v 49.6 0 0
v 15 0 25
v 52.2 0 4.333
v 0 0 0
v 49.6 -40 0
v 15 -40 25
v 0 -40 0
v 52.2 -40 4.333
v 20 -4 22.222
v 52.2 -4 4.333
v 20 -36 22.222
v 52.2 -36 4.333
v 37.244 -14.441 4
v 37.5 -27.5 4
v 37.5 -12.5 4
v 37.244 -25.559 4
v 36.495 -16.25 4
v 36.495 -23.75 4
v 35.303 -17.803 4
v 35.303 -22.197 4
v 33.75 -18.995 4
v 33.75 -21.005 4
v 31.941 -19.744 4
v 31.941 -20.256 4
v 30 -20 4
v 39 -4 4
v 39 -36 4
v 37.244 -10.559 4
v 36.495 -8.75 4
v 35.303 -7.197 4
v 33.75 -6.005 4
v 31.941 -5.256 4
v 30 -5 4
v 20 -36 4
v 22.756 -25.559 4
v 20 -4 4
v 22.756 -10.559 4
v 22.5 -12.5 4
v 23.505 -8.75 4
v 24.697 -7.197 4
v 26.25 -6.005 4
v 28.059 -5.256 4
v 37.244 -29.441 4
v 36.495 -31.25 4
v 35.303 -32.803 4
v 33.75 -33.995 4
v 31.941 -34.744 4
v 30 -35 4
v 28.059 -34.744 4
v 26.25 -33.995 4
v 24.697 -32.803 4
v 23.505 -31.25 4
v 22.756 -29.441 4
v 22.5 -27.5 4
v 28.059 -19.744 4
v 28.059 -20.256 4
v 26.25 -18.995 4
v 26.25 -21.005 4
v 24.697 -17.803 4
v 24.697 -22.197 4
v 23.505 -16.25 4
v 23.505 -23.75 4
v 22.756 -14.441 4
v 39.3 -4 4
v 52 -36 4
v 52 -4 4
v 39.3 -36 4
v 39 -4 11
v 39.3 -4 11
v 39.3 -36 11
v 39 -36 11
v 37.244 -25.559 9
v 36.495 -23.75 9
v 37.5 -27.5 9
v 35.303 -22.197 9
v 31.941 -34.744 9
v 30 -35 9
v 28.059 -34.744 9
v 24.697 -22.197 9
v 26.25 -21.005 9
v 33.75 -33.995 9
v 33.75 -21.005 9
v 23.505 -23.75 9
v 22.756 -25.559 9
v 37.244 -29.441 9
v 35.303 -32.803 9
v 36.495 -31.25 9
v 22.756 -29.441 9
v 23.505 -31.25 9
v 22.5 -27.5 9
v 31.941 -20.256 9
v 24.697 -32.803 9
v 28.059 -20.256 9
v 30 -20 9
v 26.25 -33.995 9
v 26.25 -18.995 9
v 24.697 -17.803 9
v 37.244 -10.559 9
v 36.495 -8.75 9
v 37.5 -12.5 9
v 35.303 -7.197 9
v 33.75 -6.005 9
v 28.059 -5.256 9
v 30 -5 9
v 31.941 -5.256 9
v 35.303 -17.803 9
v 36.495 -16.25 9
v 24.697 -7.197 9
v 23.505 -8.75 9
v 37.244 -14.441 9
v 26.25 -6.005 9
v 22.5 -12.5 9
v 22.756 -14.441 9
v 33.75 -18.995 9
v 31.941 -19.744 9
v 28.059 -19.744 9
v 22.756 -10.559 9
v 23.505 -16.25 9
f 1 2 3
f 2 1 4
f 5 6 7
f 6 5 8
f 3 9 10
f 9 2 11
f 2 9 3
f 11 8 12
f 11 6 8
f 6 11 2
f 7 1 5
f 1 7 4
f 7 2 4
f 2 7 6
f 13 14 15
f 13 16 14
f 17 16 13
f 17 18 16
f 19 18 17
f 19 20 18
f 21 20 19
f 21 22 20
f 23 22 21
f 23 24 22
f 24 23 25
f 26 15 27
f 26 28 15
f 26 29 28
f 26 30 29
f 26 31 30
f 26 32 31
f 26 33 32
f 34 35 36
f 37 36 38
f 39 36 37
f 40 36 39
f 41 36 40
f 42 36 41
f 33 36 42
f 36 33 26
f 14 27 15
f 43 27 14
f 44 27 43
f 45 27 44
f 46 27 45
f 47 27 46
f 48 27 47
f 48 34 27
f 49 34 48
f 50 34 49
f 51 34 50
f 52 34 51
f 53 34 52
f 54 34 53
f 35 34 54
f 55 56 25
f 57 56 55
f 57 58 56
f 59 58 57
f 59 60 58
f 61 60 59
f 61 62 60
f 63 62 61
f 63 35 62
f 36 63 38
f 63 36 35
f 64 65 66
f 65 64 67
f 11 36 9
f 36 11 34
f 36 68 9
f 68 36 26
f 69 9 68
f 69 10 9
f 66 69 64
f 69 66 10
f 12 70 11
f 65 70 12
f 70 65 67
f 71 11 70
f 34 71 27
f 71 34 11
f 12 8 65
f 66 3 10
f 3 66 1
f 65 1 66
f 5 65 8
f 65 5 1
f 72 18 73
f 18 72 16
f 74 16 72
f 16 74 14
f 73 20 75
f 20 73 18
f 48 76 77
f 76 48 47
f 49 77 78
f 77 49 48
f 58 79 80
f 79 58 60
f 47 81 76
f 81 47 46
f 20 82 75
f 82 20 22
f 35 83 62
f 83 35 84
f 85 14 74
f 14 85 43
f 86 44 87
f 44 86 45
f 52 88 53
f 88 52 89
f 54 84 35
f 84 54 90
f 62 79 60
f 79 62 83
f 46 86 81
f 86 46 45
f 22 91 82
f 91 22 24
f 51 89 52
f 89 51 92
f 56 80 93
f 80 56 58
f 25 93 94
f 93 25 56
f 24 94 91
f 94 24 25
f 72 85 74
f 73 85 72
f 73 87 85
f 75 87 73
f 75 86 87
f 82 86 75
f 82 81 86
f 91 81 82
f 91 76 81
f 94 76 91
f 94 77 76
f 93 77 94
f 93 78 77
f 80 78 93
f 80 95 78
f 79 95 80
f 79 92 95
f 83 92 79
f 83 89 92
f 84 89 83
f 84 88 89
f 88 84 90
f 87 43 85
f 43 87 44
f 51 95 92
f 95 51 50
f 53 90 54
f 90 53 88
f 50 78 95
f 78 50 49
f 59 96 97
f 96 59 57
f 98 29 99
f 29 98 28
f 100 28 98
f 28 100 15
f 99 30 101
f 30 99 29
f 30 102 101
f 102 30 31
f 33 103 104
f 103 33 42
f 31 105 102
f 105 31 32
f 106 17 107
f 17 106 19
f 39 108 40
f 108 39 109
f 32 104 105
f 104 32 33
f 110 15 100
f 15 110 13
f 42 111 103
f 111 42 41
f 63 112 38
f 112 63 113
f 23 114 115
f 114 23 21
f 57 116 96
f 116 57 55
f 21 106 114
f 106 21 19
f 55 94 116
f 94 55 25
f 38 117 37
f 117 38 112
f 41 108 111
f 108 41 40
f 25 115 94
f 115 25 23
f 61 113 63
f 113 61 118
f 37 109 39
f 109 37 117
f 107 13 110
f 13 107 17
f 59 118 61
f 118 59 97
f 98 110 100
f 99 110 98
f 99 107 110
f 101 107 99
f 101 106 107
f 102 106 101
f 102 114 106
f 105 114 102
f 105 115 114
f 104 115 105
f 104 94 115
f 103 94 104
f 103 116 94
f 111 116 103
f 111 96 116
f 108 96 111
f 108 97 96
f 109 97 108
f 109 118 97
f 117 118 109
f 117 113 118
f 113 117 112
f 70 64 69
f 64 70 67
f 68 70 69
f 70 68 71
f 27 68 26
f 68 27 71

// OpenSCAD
/*translate([0, 0, 13]) rotate([0, 45, 0]) {
    difference() {
        thickness = 3;
        border = 1.5;
        cube(size = [thickness, 20, 26], center = true);
        cube(
            size = [
                thickness,
                20 - border,
                26 - border
            ],
            center = true
        );
    }
}*/

/*
translate([0,0,-50]) {
polyhedron(
    points = [[0,0,0], [0,10,0], [10,0,0], [0,0,10]],
    faces = [[0,1,3], [0,2,1],  [1,2,3],  [0,3,2]]
);
}
*/
/*
function portal(width, height) = {
    linear_extrude(height = width) polygon(
        points=[
            [0,0],[0,height],[height,0]
        ]
    );

    translate([1, 0, 0])
    rotate([0, 0, -90])
    mirror([0,1,0])
    linear_extrude(height=1)
    polygon(
        points=[
            [0,0],[0,1],[1,0]
        ]
    );
};

portal(10, 26);
*/

/*
module portal_complex(width,height,thicknessX,thicknessY,angle=55)
{
    rotate([90,0,0]) {
        difference() {
            linear_extrude(height=width) polygon(
                [[0,0],[thicknessX,0],
                 [thicknessX+height*cos(angle)/sin(angle),height],
                 [height*cos(angle)/sin(angle),height]]
            );
            translate([0,-thicknessY,thicknessY])
            linear_extrude(height=width-thicknessY*2) 
            polygon(
                [[0,thicknessY*2],[thicknessX*2,thicknessY*2],
                 [(thicknessX*2)+(height-thicknessY*2)*cos(angle)/sin(angle),height],
                 [(height-thicknessY*2)*cos(angle)/sin(angle),height]]
            );
        };   
    };
};
  
translate([200,0,0]) portal_complex(20, 26, 2.5, 1);
*/


module rfeed_piramid(width=40) {
    rotate([90,0,0]) linear_extrude(height=width) polygon([[0,0], [15,25], [60,0]]);
};

difference() {
    rfeed_piramid();
    translate([20,-32-(40-32)/2,4]) cube([60,32,40]);
    translate([49,1,-1]) rfeed_piramid(42);
};

translate([30, -40/2, 4]) {
    union() {
        translate([0,-7.5,0])cylinder(5, d=15);
        translate([0,7.5,0]) cylinder(5, d=15);
    };
    translate([9, -(40-4*2)/2]) cube([0.3, 40-4*2, 7]);
};
